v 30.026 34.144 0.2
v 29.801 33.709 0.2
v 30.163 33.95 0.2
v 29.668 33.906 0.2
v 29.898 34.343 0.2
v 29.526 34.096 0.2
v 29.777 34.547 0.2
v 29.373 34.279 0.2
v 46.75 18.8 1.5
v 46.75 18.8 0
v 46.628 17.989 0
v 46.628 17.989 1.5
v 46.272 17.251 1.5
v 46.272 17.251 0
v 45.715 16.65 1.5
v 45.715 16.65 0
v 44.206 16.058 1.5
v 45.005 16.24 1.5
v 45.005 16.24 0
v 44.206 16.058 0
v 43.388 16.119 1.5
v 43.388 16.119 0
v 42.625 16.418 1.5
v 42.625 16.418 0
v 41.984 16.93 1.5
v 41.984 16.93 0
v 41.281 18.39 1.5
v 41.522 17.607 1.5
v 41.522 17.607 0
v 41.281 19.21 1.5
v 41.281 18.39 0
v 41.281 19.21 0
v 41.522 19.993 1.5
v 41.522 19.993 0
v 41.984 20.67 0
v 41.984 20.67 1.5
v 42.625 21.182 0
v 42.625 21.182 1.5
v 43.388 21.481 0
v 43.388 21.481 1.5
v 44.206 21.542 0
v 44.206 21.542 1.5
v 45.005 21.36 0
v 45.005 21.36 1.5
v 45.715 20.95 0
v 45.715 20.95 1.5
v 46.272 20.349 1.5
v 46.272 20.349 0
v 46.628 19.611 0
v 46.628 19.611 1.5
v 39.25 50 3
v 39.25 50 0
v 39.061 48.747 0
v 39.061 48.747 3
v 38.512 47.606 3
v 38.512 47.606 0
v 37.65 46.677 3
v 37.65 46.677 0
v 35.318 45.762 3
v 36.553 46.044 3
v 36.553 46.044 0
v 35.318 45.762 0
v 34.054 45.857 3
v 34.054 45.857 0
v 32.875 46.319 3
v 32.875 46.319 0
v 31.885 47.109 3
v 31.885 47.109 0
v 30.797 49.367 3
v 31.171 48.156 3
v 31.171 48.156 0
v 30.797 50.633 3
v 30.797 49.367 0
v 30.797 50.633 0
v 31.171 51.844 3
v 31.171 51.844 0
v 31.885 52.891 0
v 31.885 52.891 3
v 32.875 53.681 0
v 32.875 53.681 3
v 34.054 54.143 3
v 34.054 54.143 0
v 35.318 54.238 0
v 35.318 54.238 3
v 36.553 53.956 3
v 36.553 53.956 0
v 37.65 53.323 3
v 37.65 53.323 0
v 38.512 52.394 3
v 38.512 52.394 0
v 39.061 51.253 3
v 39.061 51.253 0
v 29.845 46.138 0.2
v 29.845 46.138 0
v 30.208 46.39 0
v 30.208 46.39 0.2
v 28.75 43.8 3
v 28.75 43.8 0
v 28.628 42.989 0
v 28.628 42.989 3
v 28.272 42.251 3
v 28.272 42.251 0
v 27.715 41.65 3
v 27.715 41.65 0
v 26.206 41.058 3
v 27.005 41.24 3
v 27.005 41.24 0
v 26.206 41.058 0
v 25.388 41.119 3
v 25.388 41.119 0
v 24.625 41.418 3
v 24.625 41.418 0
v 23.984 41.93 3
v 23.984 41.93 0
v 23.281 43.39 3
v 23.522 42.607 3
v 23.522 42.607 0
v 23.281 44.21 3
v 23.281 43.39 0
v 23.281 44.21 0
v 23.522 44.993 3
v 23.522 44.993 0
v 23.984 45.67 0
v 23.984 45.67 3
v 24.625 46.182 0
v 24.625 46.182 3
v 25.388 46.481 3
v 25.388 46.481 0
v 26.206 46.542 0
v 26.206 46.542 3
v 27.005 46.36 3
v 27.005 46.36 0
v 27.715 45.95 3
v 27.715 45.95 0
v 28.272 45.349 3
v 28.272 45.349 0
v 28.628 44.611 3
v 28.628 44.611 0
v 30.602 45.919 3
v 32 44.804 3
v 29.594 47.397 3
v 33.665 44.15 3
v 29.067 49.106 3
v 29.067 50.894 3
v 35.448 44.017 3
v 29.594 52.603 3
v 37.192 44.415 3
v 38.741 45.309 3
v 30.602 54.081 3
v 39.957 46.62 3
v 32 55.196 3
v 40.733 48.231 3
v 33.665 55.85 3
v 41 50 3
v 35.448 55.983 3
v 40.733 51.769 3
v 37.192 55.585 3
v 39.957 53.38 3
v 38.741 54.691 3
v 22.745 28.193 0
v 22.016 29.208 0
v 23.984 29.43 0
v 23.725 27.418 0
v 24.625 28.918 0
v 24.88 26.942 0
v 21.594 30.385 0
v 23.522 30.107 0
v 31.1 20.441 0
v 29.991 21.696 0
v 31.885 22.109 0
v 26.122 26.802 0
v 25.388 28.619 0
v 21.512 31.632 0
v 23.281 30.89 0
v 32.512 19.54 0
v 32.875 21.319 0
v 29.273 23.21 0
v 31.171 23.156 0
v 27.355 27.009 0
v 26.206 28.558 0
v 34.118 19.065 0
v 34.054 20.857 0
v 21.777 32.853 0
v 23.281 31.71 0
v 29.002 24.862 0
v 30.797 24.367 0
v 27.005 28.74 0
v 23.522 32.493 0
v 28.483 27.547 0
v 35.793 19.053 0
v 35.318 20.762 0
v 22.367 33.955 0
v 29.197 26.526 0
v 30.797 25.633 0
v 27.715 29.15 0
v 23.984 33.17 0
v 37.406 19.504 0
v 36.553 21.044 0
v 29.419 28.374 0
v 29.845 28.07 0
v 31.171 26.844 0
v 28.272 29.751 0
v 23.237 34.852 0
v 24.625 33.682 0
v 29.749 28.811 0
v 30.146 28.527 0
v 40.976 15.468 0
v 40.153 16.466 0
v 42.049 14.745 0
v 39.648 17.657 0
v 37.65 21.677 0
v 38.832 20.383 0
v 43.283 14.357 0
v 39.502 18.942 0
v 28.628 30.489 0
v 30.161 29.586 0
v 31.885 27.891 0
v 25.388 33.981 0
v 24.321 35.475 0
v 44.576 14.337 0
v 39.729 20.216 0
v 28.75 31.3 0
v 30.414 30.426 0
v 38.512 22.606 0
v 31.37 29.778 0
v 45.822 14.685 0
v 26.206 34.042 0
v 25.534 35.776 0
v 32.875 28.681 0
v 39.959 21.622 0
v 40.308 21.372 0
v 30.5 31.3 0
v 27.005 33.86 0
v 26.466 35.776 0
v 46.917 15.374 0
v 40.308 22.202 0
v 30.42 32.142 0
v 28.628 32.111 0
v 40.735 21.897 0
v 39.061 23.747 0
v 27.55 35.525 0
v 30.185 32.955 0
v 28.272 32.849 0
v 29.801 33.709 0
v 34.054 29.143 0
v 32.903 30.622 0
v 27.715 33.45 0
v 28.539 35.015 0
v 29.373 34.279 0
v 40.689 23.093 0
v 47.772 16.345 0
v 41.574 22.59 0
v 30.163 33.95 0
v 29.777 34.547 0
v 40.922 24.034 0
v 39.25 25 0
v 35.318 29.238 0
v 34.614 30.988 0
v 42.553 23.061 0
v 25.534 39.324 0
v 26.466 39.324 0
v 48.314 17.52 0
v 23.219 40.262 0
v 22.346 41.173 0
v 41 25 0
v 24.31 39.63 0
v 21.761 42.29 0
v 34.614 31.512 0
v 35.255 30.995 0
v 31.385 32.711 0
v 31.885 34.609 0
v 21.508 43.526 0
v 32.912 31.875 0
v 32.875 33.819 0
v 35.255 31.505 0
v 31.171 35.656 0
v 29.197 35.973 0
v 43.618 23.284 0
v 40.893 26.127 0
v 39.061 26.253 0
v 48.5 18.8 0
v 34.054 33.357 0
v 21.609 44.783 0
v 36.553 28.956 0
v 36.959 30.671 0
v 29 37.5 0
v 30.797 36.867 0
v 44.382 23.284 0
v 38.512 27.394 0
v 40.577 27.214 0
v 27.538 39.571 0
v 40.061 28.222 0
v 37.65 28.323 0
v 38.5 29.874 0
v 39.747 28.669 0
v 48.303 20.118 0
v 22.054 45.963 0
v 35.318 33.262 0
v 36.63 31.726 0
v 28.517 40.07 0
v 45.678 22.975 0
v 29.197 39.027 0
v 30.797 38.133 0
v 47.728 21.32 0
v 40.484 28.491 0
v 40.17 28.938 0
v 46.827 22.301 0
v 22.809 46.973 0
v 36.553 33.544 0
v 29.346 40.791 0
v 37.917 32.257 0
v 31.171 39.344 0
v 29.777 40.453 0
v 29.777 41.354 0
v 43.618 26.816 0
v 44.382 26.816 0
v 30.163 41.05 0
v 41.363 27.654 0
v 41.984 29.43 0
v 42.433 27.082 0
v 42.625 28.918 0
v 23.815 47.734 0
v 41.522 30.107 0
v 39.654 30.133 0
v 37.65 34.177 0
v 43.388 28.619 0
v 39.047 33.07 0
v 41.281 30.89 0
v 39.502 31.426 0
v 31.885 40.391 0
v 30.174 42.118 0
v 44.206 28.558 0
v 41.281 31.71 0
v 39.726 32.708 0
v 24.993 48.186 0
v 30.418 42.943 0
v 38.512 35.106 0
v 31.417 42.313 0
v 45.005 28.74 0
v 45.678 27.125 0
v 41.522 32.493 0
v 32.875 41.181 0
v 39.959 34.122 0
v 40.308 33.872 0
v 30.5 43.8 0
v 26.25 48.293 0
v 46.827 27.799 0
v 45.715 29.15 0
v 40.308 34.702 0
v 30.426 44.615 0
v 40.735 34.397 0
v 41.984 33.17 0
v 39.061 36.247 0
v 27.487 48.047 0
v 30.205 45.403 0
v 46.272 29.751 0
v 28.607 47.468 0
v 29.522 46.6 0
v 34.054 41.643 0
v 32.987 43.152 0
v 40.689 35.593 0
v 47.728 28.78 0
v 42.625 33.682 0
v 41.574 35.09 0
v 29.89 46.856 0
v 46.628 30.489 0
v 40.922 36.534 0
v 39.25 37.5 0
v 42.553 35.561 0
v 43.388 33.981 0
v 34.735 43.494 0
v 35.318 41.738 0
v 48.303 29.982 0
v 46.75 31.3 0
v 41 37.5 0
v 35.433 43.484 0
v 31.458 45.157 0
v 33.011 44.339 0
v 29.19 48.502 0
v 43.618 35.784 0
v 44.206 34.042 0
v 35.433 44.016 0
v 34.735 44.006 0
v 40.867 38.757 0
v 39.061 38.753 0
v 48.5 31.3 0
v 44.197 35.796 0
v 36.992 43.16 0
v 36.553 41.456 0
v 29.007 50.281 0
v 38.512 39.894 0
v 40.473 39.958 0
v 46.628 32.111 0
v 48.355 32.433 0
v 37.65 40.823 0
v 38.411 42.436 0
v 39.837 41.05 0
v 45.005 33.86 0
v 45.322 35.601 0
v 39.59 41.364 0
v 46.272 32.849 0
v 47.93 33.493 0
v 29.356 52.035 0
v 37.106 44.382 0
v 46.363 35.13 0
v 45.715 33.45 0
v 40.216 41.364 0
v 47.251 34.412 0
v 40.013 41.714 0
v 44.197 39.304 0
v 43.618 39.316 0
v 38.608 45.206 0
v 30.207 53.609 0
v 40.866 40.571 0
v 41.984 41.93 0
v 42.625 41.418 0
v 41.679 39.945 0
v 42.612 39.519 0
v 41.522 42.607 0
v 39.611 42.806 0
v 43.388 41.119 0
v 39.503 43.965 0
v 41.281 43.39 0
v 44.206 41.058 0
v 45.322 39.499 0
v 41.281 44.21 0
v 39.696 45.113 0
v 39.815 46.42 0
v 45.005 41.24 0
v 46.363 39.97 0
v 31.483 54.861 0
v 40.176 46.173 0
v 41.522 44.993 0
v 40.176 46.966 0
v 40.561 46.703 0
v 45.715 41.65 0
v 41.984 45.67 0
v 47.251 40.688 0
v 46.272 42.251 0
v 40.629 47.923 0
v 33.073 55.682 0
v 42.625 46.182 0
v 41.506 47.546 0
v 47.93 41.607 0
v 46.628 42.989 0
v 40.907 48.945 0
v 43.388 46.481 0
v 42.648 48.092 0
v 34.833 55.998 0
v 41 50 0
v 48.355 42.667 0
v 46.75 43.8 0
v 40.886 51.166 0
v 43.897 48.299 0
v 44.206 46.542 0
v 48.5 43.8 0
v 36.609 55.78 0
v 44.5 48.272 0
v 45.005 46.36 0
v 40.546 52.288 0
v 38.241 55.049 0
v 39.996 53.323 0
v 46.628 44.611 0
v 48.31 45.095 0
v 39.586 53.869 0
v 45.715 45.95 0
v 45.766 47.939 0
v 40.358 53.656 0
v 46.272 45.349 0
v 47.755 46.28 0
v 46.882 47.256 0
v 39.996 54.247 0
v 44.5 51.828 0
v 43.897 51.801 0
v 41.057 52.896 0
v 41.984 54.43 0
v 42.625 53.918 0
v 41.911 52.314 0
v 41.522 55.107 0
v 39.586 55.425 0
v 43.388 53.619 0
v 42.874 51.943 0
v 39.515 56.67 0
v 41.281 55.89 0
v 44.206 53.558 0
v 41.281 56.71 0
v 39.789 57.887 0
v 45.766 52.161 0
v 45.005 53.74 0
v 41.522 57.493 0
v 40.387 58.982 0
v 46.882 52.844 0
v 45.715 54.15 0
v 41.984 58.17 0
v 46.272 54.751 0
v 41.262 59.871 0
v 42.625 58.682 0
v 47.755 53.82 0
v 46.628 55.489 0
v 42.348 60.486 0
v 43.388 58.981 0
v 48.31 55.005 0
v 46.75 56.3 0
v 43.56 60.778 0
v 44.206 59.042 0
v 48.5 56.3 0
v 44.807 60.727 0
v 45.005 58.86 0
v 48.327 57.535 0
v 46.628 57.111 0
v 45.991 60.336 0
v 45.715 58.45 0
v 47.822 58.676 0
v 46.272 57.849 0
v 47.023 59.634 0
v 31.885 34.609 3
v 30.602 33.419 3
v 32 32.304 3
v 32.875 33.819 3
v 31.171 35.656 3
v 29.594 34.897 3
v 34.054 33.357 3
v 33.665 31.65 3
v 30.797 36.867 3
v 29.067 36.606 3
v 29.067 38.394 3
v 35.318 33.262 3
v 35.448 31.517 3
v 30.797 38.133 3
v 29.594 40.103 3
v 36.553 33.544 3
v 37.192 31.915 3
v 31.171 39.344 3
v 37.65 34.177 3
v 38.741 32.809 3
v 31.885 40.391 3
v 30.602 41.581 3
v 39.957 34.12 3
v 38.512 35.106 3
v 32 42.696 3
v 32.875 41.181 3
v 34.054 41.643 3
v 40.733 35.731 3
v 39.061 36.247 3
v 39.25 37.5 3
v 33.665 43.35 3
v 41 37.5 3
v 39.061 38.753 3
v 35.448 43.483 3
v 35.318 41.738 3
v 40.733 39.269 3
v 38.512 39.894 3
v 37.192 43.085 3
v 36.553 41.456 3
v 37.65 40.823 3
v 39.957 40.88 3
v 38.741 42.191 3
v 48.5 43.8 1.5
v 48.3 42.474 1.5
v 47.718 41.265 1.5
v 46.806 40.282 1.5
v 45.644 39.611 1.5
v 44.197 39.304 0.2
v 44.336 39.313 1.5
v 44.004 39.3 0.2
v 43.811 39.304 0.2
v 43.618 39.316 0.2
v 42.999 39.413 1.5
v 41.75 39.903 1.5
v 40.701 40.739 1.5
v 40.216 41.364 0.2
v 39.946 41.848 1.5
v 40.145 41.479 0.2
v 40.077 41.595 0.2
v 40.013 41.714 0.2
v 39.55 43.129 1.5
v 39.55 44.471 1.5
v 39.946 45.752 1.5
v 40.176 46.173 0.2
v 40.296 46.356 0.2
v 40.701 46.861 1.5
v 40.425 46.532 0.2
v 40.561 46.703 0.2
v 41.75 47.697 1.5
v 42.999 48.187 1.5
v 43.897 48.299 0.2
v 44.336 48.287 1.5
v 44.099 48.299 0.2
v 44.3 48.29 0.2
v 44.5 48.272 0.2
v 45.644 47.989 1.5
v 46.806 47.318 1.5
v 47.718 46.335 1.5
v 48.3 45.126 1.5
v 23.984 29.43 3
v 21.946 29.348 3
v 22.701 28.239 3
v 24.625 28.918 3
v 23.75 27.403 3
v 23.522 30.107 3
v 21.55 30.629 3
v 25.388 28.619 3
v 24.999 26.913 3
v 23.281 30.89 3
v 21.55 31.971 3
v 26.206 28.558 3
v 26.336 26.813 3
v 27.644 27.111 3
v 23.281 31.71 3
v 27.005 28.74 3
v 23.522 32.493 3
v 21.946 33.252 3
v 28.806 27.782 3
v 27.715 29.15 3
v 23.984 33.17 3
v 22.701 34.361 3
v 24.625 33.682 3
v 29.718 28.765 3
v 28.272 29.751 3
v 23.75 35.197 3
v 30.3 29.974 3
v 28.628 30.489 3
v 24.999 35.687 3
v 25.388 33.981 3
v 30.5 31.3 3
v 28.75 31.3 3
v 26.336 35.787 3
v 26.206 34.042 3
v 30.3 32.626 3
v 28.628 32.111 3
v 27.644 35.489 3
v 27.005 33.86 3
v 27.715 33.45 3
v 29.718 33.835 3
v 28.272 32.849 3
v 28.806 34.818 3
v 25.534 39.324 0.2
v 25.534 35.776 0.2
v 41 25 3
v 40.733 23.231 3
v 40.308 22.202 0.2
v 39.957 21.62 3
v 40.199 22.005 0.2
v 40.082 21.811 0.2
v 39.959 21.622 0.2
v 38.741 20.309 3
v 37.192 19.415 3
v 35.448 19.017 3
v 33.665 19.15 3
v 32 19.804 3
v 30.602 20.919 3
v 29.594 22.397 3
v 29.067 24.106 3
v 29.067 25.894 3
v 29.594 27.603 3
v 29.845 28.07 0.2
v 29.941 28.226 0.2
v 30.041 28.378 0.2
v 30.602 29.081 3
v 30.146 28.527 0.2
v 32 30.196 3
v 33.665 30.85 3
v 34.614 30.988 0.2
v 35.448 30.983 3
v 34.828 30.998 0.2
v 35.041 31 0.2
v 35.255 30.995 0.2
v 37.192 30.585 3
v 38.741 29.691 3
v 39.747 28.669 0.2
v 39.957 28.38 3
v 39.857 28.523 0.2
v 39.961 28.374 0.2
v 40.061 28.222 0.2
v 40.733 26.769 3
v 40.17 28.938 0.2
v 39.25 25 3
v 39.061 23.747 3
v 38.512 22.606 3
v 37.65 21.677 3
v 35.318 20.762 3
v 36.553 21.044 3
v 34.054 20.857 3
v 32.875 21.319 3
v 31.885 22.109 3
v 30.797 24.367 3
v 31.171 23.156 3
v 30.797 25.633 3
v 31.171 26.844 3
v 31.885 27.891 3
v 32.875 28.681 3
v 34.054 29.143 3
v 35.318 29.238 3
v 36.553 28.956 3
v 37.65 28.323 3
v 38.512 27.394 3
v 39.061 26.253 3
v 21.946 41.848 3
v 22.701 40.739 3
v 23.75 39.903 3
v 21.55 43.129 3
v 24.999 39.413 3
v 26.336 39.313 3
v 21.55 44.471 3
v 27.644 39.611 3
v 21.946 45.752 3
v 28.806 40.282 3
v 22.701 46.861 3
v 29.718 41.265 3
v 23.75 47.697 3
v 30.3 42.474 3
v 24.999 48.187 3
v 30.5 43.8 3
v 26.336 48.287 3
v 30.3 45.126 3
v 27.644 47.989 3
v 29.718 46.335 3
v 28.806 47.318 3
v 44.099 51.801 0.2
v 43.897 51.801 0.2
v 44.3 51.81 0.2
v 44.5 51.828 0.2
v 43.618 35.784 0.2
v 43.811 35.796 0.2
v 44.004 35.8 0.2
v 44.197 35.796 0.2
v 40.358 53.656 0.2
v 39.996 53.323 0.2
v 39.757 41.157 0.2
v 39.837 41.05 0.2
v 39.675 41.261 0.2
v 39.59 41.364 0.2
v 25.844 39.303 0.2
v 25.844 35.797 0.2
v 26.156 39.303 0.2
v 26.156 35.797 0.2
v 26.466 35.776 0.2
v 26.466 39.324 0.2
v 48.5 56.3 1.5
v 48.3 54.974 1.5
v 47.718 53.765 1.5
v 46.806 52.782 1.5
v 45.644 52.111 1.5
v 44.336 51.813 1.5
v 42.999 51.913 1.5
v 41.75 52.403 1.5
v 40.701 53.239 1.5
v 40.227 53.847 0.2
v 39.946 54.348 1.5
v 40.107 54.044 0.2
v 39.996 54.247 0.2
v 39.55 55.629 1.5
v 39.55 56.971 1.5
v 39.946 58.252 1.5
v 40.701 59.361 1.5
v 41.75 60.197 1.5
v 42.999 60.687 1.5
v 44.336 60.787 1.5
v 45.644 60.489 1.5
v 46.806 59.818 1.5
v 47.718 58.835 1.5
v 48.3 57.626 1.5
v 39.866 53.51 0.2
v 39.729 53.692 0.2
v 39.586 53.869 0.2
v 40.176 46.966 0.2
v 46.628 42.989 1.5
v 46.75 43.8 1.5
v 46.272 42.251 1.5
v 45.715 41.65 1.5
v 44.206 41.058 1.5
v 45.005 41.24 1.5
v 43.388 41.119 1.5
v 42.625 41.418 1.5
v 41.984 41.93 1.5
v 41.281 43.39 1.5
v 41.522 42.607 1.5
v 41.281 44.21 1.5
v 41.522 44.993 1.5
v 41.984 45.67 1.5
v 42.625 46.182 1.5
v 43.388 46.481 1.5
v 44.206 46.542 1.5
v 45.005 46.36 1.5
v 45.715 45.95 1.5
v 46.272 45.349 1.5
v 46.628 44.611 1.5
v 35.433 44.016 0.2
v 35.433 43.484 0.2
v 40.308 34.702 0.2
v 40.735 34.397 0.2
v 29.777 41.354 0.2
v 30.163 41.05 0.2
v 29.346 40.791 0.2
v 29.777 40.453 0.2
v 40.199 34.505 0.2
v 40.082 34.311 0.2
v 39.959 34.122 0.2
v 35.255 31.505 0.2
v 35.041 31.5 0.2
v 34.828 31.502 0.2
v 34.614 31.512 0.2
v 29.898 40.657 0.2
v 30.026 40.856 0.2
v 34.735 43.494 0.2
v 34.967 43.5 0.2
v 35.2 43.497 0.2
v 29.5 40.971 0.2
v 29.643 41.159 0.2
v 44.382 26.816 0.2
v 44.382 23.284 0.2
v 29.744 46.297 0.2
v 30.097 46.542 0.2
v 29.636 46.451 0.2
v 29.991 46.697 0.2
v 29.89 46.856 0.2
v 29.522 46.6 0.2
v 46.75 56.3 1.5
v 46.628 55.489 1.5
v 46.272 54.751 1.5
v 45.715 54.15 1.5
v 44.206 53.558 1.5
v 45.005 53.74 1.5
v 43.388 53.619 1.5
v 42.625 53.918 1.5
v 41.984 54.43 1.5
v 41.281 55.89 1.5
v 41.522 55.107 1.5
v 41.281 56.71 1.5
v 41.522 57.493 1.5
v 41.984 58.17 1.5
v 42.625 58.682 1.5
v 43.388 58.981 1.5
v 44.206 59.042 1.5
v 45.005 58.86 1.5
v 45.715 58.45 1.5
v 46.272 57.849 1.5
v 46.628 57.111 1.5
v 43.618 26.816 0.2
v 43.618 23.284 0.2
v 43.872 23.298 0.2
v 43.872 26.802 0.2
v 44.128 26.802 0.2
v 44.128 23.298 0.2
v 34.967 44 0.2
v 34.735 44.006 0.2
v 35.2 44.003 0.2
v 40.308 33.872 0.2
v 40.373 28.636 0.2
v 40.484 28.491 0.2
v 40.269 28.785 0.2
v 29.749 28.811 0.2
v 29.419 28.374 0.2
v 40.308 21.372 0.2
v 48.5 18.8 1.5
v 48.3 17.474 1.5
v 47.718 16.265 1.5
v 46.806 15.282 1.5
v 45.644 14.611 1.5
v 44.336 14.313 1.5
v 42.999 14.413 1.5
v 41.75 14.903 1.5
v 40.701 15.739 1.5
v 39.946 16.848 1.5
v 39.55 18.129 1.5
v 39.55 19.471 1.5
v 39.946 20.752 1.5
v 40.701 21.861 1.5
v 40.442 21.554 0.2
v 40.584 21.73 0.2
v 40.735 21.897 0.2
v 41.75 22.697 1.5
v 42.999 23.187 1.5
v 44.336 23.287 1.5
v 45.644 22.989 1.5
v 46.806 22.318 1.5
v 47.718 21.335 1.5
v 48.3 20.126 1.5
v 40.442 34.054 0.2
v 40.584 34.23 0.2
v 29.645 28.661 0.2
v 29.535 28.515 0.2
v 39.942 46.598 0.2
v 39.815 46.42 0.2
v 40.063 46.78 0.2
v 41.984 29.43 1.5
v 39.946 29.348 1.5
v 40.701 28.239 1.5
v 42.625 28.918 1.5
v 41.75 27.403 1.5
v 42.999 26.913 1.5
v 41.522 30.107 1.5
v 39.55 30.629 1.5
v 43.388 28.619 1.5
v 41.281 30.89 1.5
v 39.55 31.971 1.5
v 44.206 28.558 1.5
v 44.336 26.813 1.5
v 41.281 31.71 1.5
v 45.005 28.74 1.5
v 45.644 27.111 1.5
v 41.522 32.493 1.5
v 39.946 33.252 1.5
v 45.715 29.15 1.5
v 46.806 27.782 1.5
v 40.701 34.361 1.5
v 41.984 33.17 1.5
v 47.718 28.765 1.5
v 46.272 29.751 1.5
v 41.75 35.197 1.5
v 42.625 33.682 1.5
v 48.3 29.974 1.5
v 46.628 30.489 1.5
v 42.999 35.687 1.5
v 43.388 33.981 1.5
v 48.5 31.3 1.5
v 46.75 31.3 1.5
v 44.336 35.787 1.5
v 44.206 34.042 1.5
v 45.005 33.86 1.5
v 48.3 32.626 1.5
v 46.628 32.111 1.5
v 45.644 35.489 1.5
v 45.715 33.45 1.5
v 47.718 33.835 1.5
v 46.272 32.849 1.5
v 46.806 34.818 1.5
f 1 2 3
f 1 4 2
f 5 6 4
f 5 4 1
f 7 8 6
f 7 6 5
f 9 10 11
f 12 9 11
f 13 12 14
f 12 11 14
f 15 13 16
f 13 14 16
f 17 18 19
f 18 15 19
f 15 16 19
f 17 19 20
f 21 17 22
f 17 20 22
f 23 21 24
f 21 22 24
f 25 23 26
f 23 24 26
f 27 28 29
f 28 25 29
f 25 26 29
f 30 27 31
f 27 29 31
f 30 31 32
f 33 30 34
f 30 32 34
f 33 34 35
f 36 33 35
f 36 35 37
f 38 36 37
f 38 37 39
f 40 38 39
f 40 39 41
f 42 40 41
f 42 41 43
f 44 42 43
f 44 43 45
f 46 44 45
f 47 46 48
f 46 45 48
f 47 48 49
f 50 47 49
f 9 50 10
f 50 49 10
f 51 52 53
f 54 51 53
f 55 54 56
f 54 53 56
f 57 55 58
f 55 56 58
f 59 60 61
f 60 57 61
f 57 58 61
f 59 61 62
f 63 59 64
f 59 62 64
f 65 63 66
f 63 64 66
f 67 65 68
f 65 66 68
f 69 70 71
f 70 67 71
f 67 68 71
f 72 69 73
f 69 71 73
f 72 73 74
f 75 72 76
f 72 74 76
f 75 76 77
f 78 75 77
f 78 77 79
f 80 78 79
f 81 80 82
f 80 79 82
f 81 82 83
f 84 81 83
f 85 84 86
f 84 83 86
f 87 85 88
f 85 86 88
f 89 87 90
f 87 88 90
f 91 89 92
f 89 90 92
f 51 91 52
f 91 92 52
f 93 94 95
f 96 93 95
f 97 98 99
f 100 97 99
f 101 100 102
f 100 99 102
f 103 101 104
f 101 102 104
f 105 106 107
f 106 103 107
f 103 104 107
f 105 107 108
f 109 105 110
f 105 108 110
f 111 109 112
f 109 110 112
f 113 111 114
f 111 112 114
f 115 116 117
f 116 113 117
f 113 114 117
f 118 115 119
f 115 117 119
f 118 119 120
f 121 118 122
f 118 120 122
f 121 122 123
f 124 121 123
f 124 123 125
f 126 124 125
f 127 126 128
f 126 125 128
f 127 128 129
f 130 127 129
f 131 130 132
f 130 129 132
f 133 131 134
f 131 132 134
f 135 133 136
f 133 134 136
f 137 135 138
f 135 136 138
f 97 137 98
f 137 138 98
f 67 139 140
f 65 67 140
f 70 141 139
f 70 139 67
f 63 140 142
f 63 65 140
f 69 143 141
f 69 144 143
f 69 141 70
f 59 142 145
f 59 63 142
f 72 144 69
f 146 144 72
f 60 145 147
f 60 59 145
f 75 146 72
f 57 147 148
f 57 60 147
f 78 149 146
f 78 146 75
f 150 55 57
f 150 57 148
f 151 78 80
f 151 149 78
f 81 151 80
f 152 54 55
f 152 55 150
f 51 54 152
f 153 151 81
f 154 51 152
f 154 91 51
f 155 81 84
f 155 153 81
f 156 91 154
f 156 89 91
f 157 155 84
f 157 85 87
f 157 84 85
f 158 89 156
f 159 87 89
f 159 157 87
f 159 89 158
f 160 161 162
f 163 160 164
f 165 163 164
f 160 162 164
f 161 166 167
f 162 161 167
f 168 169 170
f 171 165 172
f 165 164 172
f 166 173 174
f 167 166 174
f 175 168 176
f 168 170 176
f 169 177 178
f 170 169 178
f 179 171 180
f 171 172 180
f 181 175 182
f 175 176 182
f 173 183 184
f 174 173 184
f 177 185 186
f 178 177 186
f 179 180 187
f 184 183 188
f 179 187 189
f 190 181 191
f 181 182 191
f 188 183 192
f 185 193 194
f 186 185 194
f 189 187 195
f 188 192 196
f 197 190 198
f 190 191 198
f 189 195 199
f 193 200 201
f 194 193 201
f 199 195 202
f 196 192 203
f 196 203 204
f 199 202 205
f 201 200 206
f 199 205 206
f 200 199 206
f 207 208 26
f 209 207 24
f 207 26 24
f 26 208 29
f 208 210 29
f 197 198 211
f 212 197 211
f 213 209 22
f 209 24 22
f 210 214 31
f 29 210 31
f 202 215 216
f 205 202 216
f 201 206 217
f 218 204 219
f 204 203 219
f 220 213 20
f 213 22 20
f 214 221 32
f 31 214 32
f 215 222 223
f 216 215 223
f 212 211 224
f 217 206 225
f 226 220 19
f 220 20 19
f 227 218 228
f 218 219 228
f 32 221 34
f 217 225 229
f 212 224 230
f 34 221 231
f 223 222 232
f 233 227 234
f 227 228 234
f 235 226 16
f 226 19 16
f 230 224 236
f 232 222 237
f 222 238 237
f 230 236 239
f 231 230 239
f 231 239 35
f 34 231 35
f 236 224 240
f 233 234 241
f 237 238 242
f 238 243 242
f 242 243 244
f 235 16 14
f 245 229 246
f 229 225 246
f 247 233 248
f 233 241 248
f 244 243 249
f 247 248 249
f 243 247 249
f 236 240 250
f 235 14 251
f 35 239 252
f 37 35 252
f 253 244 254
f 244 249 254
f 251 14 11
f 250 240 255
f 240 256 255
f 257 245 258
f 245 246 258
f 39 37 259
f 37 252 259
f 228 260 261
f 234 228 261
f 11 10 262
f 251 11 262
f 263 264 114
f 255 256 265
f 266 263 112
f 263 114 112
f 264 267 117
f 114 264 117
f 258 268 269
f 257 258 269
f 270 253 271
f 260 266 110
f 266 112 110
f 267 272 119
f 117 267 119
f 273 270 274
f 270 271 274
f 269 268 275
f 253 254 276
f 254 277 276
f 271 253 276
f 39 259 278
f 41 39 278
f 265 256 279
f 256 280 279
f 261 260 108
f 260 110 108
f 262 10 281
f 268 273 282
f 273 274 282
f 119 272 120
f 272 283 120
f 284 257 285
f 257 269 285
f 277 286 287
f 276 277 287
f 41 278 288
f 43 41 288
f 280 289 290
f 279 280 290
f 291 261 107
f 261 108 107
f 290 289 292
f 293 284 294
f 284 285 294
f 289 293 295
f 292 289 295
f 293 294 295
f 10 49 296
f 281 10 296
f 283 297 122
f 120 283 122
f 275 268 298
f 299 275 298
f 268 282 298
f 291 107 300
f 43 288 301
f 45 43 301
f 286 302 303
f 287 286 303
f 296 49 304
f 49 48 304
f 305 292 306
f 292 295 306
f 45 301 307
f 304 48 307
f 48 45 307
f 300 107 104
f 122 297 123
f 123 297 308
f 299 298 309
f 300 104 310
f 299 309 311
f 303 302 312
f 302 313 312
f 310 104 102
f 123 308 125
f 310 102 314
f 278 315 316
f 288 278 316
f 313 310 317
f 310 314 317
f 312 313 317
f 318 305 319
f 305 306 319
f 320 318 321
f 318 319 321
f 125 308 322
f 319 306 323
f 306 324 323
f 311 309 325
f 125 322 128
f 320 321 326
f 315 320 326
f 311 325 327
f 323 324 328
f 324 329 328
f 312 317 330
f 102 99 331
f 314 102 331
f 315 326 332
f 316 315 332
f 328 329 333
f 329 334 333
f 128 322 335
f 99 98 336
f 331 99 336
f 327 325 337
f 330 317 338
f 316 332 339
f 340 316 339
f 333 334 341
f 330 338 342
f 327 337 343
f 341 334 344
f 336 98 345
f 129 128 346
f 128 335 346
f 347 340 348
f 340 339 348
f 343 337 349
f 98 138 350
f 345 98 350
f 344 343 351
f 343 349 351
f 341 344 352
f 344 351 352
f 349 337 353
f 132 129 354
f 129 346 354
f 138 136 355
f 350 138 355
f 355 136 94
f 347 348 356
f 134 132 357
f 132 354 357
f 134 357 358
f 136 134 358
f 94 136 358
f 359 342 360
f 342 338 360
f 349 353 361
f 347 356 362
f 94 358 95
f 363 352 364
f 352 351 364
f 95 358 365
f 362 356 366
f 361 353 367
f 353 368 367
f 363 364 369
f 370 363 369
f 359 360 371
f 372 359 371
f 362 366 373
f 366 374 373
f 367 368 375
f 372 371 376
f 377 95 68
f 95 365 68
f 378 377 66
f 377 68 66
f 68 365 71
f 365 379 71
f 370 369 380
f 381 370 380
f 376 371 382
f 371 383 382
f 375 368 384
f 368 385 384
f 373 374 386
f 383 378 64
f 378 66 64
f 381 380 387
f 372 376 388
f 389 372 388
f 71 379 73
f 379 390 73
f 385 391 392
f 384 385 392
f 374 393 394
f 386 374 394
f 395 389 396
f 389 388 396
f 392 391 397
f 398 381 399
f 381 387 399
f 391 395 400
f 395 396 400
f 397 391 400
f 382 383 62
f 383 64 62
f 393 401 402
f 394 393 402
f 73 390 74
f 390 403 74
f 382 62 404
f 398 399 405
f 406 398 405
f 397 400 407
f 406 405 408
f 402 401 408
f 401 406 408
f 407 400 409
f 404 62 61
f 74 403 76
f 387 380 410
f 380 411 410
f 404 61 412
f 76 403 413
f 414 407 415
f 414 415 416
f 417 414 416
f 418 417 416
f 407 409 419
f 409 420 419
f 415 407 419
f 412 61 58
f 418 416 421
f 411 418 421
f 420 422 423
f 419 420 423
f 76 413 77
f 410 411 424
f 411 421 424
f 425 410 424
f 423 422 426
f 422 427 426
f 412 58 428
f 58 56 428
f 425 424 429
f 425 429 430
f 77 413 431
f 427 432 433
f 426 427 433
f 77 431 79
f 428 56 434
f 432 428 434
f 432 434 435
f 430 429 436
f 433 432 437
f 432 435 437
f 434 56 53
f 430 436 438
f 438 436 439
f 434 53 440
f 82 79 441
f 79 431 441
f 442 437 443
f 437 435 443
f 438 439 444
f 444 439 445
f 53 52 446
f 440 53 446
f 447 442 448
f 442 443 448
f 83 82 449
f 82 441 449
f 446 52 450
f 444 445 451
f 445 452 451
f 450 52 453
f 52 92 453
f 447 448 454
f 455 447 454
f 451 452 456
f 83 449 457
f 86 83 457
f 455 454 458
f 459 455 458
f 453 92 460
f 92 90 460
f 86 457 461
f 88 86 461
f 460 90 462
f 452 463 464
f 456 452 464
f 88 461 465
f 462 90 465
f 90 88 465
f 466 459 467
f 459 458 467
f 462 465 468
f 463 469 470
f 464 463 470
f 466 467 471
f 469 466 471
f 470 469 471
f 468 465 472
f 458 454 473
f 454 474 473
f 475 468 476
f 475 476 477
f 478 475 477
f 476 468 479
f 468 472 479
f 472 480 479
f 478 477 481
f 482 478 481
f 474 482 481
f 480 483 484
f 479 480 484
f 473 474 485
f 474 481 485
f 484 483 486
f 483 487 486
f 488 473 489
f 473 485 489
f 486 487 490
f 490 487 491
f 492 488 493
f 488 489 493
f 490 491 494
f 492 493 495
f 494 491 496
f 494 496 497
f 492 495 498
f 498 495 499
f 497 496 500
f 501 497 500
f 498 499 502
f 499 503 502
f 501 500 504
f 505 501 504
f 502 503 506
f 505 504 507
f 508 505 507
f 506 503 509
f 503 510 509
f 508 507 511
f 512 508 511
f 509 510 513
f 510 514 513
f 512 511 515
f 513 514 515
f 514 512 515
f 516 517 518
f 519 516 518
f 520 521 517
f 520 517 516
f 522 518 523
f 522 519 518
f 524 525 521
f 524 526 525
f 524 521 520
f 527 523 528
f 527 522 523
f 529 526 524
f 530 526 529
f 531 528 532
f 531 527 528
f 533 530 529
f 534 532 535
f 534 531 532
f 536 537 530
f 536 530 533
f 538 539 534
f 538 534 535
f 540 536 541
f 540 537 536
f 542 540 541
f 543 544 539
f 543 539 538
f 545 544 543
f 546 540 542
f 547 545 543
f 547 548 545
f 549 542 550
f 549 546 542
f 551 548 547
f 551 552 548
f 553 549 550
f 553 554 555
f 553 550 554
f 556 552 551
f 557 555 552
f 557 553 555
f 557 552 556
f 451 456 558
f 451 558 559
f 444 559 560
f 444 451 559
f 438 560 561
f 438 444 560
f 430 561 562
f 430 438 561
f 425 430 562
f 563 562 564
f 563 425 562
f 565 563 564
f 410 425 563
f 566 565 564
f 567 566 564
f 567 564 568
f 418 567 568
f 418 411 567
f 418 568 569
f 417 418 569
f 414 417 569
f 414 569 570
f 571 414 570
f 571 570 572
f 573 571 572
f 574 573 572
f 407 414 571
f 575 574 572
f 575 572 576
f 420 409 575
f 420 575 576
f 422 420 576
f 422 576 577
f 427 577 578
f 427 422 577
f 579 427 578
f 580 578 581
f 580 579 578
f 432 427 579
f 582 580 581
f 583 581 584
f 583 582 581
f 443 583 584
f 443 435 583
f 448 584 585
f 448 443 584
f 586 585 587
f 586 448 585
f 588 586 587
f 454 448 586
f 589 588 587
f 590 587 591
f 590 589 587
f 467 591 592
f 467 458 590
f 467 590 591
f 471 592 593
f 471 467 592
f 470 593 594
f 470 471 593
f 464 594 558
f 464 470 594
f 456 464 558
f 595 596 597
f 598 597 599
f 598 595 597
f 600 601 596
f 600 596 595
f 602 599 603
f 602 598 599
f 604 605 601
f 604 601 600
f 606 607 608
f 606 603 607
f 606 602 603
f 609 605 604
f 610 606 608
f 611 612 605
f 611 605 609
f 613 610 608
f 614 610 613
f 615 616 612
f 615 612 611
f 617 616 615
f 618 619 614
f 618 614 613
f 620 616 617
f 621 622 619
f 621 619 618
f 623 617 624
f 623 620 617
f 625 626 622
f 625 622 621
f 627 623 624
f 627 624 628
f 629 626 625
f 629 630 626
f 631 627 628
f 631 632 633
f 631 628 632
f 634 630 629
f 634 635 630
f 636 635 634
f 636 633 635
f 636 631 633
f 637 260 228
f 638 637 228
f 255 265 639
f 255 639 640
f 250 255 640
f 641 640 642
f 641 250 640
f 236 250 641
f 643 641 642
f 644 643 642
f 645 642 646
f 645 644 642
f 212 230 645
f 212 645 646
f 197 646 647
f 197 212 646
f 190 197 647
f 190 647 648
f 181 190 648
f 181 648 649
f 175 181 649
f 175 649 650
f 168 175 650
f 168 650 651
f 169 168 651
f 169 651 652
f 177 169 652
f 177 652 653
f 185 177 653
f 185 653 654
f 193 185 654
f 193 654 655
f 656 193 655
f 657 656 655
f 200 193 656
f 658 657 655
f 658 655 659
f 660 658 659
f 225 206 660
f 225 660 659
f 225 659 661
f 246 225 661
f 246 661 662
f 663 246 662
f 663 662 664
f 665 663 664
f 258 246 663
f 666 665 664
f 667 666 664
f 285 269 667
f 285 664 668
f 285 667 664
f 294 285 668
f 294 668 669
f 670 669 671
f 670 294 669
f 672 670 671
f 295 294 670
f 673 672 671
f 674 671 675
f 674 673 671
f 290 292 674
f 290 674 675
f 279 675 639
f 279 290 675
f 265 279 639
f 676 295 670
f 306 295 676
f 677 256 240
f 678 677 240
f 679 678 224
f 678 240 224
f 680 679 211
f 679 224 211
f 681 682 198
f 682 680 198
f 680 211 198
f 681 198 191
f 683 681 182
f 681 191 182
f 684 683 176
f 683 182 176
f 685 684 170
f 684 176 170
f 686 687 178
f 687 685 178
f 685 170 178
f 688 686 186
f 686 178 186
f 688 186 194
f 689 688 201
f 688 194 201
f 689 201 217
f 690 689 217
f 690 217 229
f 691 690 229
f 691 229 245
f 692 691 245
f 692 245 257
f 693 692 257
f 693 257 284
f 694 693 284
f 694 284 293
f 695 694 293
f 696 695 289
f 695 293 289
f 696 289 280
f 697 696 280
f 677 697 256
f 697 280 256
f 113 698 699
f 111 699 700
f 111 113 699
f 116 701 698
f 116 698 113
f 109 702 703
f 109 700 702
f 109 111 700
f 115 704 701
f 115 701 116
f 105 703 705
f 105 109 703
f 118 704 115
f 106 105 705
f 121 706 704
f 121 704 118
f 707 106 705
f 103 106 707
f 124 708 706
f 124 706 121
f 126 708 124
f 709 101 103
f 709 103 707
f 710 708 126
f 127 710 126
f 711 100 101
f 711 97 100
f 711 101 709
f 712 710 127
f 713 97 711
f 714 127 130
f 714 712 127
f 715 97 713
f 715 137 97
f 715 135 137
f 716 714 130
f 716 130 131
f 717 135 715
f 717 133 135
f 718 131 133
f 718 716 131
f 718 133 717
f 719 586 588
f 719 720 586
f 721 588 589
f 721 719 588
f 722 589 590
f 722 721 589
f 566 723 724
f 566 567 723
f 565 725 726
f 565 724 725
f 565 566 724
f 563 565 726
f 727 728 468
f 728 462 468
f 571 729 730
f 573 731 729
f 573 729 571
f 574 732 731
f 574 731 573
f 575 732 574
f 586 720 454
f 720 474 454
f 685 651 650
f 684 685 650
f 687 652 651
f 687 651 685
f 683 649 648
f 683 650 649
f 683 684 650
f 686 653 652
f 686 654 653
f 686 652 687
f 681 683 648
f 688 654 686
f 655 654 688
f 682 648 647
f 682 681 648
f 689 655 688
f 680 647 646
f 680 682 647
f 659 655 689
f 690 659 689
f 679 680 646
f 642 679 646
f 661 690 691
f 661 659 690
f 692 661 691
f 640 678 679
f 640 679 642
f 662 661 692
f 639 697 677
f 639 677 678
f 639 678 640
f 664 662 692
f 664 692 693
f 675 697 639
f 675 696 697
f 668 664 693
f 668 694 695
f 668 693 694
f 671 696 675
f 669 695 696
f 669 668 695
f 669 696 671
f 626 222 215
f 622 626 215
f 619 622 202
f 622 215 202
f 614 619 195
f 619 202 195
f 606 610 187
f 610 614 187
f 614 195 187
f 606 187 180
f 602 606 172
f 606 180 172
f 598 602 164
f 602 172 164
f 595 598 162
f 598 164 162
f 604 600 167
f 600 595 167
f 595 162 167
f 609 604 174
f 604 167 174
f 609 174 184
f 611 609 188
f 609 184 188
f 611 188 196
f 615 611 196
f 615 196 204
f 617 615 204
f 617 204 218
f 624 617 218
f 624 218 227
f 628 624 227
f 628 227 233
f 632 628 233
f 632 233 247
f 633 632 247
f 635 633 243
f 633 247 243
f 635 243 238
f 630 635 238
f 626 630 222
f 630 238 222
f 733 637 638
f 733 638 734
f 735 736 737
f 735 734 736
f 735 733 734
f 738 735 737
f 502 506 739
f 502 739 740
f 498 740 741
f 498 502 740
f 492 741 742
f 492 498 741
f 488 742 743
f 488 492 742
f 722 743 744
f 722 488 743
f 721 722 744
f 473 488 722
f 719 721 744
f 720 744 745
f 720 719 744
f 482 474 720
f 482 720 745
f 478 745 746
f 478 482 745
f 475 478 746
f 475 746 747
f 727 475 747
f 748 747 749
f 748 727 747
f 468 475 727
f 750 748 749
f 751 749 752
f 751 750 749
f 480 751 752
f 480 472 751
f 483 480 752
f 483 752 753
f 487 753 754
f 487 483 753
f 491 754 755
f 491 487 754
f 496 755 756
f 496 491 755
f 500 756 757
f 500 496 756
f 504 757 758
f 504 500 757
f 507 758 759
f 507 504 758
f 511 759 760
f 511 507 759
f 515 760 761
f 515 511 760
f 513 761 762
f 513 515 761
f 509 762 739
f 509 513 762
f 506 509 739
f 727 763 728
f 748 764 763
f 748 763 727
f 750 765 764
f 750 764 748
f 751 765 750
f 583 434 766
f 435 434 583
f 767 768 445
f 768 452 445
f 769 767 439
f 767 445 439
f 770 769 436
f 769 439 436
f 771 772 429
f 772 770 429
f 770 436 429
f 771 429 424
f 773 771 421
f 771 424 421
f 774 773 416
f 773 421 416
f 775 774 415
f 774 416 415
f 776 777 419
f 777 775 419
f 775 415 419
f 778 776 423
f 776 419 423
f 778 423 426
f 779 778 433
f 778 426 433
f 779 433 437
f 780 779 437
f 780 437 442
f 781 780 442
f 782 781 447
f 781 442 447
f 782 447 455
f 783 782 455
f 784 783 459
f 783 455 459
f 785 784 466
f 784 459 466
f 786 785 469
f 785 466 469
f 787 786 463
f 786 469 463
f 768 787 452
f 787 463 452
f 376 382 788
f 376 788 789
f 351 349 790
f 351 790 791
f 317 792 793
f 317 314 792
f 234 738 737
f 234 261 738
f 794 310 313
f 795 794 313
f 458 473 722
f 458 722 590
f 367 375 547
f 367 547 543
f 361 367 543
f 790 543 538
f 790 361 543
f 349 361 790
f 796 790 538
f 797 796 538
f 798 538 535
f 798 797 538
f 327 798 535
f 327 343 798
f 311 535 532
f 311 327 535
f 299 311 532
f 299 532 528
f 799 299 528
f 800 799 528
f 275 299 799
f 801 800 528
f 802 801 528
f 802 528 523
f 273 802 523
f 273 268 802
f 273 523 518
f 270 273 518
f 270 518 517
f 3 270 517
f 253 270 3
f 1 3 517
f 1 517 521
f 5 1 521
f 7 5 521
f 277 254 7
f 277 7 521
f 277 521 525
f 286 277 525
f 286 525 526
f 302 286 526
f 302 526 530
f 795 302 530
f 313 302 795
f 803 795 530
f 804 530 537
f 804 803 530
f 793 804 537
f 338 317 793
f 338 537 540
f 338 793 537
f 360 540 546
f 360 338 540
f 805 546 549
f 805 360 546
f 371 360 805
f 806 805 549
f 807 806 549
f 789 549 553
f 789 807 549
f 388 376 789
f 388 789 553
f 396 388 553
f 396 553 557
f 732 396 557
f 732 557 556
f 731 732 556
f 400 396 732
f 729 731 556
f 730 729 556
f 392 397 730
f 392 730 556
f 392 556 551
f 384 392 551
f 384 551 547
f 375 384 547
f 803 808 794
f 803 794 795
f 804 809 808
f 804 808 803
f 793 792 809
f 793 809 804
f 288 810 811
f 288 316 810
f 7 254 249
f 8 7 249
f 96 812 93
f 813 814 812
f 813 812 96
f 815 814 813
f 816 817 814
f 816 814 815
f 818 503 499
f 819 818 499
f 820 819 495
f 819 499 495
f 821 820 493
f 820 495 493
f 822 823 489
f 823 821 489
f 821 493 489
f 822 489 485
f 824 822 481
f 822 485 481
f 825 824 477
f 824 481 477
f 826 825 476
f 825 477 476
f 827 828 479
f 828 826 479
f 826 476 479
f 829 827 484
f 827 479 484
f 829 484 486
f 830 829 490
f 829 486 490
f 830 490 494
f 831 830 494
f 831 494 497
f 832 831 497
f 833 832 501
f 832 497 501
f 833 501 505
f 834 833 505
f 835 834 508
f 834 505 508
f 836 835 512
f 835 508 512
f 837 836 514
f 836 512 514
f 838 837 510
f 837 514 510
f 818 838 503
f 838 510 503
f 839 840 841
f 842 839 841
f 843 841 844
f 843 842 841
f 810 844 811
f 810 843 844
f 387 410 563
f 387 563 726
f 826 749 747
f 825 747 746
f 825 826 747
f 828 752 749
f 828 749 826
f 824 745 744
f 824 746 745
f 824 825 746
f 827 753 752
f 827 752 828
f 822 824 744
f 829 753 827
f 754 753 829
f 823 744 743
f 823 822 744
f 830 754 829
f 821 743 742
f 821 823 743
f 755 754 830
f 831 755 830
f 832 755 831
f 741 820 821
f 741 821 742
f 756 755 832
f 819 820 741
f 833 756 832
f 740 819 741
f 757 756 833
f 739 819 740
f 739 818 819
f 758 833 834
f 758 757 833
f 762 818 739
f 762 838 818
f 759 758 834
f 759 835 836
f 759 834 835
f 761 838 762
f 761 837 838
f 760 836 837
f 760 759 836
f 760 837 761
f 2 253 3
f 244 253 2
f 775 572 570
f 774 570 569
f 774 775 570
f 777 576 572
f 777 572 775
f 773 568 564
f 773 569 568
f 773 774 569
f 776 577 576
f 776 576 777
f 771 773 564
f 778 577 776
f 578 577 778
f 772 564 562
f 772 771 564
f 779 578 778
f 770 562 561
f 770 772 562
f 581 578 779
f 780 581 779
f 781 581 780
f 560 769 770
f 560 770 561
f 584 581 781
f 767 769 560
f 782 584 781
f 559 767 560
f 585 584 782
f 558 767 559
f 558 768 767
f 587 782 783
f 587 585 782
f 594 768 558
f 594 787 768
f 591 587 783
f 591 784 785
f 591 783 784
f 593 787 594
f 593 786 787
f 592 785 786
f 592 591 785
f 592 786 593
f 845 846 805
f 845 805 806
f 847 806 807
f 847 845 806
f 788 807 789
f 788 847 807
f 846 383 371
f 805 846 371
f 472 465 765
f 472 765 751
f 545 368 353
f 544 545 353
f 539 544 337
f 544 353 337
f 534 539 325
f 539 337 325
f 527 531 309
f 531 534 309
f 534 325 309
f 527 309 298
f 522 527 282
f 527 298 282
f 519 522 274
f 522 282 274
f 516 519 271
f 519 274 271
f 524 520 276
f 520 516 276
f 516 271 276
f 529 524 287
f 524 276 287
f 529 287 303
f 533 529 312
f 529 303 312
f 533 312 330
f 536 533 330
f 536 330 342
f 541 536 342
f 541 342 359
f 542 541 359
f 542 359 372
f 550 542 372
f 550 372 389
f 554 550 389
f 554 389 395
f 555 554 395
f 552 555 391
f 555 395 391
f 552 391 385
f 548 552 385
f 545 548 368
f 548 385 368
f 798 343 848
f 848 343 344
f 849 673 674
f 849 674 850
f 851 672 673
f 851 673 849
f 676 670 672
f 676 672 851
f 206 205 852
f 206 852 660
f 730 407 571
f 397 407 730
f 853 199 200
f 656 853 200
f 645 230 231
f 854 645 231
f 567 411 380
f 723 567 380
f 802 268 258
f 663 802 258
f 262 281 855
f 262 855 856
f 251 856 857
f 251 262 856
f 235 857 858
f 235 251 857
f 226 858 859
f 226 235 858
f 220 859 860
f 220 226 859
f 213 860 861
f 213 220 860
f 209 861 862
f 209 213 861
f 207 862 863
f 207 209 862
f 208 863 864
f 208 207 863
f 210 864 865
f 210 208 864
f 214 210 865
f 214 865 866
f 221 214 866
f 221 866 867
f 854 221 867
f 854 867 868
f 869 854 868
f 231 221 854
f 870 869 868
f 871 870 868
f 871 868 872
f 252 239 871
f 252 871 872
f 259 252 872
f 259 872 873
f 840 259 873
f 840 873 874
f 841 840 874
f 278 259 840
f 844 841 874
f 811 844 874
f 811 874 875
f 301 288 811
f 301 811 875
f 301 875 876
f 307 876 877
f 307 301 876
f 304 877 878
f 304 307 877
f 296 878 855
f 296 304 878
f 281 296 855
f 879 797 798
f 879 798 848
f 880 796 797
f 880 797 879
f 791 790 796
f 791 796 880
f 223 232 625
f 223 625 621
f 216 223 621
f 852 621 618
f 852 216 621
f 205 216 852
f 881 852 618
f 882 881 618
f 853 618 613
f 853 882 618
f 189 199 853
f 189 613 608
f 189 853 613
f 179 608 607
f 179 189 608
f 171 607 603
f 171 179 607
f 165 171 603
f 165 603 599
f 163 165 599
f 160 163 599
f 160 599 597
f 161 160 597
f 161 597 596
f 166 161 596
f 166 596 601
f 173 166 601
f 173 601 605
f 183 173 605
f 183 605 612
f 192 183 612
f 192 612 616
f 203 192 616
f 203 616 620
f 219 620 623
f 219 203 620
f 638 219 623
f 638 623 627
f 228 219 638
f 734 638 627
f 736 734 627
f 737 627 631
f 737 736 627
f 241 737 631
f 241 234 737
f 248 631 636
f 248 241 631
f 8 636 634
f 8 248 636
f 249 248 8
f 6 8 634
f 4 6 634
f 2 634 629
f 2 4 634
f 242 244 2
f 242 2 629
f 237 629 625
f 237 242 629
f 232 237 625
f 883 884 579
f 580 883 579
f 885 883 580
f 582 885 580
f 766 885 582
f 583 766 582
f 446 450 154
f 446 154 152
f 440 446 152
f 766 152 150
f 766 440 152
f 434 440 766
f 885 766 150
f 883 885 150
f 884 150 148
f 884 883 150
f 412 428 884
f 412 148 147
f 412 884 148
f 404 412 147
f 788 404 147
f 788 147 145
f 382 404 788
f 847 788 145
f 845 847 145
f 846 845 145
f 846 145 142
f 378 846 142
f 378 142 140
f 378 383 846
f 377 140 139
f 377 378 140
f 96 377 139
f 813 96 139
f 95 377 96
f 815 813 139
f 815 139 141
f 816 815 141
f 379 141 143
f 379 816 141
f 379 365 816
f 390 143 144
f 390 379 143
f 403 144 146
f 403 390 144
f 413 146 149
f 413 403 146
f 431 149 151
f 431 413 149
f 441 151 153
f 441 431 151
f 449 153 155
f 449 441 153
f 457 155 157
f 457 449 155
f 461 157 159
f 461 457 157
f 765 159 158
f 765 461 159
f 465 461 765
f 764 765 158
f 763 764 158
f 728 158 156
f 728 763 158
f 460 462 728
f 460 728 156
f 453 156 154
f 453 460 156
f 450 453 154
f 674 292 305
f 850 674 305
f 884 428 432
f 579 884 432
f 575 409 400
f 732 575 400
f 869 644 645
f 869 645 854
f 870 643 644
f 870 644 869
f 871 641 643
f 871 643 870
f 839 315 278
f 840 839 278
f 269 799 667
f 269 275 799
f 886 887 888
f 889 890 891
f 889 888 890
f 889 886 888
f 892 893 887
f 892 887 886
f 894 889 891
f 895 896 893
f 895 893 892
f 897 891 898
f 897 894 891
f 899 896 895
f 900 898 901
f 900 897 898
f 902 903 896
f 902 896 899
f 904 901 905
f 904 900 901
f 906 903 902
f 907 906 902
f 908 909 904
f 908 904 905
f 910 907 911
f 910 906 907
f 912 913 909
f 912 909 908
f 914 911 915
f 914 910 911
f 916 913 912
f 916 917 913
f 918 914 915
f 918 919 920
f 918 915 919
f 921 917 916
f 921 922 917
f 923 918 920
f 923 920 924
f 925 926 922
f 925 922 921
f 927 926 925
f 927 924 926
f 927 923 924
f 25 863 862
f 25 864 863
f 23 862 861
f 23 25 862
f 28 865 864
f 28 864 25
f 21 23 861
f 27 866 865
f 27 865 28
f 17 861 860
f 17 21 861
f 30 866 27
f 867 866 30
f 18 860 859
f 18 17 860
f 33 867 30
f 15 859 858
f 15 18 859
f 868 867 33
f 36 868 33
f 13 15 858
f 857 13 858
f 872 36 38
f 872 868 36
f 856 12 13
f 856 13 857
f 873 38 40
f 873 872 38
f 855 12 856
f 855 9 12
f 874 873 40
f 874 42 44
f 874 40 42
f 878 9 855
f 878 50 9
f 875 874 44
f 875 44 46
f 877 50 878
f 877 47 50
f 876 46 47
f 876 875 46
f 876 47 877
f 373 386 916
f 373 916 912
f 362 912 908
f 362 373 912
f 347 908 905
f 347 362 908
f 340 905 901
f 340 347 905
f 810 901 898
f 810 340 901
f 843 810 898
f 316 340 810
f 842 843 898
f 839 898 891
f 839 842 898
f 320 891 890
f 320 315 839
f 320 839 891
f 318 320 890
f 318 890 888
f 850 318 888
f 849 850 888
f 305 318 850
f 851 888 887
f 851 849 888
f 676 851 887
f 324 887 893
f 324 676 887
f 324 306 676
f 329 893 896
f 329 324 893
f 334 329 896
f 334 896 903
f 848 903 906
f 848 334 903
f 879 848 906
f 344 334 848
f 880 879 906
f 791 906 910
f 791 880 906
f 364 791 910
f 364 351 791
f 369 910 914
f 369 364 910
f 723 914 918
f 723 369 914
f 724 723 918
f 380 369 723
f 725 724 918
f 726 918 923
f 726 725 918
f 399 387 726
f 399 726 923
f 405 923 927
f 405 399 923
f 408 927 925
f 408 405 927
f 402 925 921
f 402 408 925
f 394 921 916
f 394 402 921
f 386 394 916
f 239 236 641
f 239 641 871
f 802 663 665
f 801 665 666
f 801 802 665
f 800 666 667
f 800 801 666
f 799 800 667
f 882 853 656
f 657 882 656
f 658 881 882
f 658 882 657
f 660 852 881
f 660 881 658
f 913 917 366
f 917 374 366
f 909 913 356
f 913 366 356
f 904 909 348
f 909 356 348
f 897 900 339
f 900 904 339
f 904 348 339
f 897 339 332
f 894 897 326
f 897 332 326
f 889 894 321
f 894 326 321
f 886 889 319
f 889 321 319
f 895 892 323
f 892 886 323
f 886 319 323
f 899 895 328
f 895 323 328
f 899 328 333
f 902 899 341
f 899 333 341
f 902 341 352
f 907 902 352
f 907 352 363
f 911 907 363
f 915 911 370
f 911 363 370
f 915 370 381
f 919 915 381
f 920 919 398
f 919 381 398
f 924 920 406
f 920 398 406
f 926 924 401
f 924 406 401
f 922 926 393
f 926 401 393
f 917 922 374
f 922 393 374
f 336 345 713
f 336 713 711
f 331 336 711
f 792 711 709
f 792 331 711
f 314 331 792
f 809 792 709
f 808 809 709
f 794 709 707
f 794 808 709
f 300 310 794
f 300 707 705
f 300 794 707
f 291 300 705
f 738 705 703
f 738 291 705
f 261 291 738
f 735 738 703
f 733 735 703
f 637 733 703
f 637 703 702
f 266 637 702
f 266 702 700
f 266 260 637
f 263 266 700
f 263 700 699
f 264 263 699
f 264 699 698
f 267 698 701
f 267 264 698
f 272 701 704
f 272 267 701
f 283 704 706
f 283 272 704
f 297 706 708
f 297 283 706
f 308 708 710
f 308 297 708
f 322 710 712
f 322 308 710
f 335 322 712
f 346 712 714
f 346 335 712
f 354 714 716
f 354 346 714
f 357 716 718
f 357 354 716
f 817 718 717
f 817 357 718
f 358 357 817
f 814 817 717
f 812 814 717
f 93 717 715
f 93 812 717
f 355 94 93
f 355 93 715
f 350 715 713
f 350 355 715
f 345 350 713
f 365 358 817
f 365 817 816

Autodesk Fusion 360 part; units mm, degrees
sketch "Sketch1" plane through (0, 0, 0) normal (0, 0, 1) x (1, 0, 0)
  circle A0 centre (35, 25) radius 4.25
  circle A1 centre (35, 25) radius 6
  circle A2 centre (35, 37.5) radius 6
  circle A3 centre (35, 37.5) radius 4.25
  circle A4 centre (35, 50) radius 6
  circle A5 centre (35, 50) radius 4.25
  circle A6 centre (26, 31.3) radius 4.5
  circle A7 centre (26, 31.3) radius 2.75
  circle A8 centre (26, 43.8) radius 4.5
  circle A9 centre (26, 43.8) radius 2.75
  circle A10 centre (44, 31.3) radius 4.5
  circle A11 centre (44, 31.3) radius 2.75
  circle A12 centre (44, 18.8) radius 2.75
  circle A13 centre (44, 18.8) radius 4.5
  circle A14 centre (44, 56.3) radius 4.5
  circle A15 centre (44, 56.3) radius 2.75
  circle A16 centre (44, 43.8) radius 4.5
  circle A17 centre (44, 43.8) radius 2.75
  line L0 (29.5225, 46.6003) -> (29.8899, 46.8556)
  line L1 (29.8449, 46.1381) -> (30.2075, 46.39)
  line L2 (34.7346, 44.0059) -> (34.7346, 43.4941)
  line L3 (35.433, 44.0156) -> (35.433, 43.2)
  line L4 (29.3463, 40.7913) -> (29.7769, 40.4528)
  line L5 (29.7769, 41.3535) -> (30.1629, 41.05)
  line L6 (29.7769, 34.5472) -> (29.373, 34.2787)
  line L7 (30.1629, 33.95) -> (29.8008, 33.7092)
  line L8 (34.6142, 31.5124) -> (34.6142, 30.9876)
  line L9 (35.2551, 31.5124) -> (35.2551, 30.9946)
  line L10 (29.4191, 28.3743) -> (29.8451, 28.0703)
  line L11 (29.7489, 28.8109) -> (30.1463, 28.5273)
  line L12 (39.7474, 28.6691) -> (40.1698, 28.9378)
  line L13 (40.0613, 28.2223) -> (40.4842, 28.4913)
  line L14 (39.9586, 34.1218) -> (40.3078, 33.8725)
  line L15 (40.3078, 34.7024) -> (40.7354, 34.3972)
  line L16 (40.3078, 22.2024) -> (40.7354, 21.8972)
  line L17 (39.9586, 21.6218) -> (40.3078, 21.3725)
  line L18 (43.6177, 26.8163) -> (43.6177, 23.2837)
  line L19 (44.3823, 26.8163) -> (44.3823, 23.2837)
  line L20 (43.6177, 39.3163) -> (43.6177, 35.7837)
  line L21 (44.1969, 39.3043) -> (44.1969, 35.7957)
  line L22 (40.0129, 41.7137) -> (39.59, 41.3642)
  line L23 (40.2163, 41.3642) -> (39.8367, 41.0505)
  line L24 (39.8151, 46.4203) -> (40.1765, 46.1729)
  line L25 (40.1765, 46.9662) -> (40.5614, 46.7028)
  line L26 (39.5856, 53.8694) -> (39.9958, 54.2466)
  line L27 (39.9958, 53.3229) -> (40.3584, 53.6564)
  line L28 (43.8974, 51.8012) -> (43.8974, 48.2988)
  line L29 (44.5001, 51.8279) -> (44.5001, 48.2721)
  line L30 (25.5335, 39.3242) -> (25.5335, 35.7758)
  line L31 (26.4665, 39.3242) -> (26.4665, 35.7758)
  dimension "d1" = 8.5
  dimension "d2" = 12
  dimension "d5" = 8.5
  dimension "d6" = 12
  dimension "d7" = 8.5
  dimension "d8" = 12
  dimension "d19" = 5.5
  dimension "d20" = 9
  dimension "d21" = 5.5
  dimension "d22" = 9
  dimension "d23" = 5.5
  dimension "d24" = 9
  dimension "d25" = 5.5
  dimension "d26" = 9
  dimension "d27" = 5.5
  dimension "d28" = 9
  dimension "d29" = 5.5
  dimension "d30" = 9
extrude "Extrude1" add sketch "Sketch1" along normal blind 3 contours A1 | A2 | A6 | A8 | A4 makes body 1 at (40.9702, 36.9026, 1) makes body 2 at (30.4776, 30.8519, 1) makes body 3 at (40.9702, 50.5974, 2) makes body 4 at (30.4776, 44.2481, 2) makes body 5 at (40.9702, 24.4026, 1)
extrude "Extrude2" add sketch "Sketch1" along normal blind 1.5 separate body contours A10 | A13 | A16 | A14 makes body 6 at (48.4776, 31.7481, 1) makes body 7 at (48.4776, 43.3519, 0.5) makes body 8 at (48.4776, 18.3519, 0.5) makes body 9 at (48.4776, 56.7481, 1)
extrude "Extrude3" add sketch "Sketch1" along normal blind 0.2 contours A1 A10 L12 L13 | A1 A13 L16 L17 | A1 A2 L8 L9 | A10 A13 L18 L19 | A1 A6 L10 L11 | A2 A10 L14 L15 | A6 A8 L30 L31 | A2 A6 L6 L7 | A10 A16 L20 L21 | A4 A8 L0 L1 | A2 A8 L4 L5 | A2 A16 L22 L23 | A14 A16 L28 L29 | A4 A14 L26 L27 | A2 A4 L2 L3 | A4 A16 L24 L25 bodies 1 2 3 4 5 6 7 8 9
